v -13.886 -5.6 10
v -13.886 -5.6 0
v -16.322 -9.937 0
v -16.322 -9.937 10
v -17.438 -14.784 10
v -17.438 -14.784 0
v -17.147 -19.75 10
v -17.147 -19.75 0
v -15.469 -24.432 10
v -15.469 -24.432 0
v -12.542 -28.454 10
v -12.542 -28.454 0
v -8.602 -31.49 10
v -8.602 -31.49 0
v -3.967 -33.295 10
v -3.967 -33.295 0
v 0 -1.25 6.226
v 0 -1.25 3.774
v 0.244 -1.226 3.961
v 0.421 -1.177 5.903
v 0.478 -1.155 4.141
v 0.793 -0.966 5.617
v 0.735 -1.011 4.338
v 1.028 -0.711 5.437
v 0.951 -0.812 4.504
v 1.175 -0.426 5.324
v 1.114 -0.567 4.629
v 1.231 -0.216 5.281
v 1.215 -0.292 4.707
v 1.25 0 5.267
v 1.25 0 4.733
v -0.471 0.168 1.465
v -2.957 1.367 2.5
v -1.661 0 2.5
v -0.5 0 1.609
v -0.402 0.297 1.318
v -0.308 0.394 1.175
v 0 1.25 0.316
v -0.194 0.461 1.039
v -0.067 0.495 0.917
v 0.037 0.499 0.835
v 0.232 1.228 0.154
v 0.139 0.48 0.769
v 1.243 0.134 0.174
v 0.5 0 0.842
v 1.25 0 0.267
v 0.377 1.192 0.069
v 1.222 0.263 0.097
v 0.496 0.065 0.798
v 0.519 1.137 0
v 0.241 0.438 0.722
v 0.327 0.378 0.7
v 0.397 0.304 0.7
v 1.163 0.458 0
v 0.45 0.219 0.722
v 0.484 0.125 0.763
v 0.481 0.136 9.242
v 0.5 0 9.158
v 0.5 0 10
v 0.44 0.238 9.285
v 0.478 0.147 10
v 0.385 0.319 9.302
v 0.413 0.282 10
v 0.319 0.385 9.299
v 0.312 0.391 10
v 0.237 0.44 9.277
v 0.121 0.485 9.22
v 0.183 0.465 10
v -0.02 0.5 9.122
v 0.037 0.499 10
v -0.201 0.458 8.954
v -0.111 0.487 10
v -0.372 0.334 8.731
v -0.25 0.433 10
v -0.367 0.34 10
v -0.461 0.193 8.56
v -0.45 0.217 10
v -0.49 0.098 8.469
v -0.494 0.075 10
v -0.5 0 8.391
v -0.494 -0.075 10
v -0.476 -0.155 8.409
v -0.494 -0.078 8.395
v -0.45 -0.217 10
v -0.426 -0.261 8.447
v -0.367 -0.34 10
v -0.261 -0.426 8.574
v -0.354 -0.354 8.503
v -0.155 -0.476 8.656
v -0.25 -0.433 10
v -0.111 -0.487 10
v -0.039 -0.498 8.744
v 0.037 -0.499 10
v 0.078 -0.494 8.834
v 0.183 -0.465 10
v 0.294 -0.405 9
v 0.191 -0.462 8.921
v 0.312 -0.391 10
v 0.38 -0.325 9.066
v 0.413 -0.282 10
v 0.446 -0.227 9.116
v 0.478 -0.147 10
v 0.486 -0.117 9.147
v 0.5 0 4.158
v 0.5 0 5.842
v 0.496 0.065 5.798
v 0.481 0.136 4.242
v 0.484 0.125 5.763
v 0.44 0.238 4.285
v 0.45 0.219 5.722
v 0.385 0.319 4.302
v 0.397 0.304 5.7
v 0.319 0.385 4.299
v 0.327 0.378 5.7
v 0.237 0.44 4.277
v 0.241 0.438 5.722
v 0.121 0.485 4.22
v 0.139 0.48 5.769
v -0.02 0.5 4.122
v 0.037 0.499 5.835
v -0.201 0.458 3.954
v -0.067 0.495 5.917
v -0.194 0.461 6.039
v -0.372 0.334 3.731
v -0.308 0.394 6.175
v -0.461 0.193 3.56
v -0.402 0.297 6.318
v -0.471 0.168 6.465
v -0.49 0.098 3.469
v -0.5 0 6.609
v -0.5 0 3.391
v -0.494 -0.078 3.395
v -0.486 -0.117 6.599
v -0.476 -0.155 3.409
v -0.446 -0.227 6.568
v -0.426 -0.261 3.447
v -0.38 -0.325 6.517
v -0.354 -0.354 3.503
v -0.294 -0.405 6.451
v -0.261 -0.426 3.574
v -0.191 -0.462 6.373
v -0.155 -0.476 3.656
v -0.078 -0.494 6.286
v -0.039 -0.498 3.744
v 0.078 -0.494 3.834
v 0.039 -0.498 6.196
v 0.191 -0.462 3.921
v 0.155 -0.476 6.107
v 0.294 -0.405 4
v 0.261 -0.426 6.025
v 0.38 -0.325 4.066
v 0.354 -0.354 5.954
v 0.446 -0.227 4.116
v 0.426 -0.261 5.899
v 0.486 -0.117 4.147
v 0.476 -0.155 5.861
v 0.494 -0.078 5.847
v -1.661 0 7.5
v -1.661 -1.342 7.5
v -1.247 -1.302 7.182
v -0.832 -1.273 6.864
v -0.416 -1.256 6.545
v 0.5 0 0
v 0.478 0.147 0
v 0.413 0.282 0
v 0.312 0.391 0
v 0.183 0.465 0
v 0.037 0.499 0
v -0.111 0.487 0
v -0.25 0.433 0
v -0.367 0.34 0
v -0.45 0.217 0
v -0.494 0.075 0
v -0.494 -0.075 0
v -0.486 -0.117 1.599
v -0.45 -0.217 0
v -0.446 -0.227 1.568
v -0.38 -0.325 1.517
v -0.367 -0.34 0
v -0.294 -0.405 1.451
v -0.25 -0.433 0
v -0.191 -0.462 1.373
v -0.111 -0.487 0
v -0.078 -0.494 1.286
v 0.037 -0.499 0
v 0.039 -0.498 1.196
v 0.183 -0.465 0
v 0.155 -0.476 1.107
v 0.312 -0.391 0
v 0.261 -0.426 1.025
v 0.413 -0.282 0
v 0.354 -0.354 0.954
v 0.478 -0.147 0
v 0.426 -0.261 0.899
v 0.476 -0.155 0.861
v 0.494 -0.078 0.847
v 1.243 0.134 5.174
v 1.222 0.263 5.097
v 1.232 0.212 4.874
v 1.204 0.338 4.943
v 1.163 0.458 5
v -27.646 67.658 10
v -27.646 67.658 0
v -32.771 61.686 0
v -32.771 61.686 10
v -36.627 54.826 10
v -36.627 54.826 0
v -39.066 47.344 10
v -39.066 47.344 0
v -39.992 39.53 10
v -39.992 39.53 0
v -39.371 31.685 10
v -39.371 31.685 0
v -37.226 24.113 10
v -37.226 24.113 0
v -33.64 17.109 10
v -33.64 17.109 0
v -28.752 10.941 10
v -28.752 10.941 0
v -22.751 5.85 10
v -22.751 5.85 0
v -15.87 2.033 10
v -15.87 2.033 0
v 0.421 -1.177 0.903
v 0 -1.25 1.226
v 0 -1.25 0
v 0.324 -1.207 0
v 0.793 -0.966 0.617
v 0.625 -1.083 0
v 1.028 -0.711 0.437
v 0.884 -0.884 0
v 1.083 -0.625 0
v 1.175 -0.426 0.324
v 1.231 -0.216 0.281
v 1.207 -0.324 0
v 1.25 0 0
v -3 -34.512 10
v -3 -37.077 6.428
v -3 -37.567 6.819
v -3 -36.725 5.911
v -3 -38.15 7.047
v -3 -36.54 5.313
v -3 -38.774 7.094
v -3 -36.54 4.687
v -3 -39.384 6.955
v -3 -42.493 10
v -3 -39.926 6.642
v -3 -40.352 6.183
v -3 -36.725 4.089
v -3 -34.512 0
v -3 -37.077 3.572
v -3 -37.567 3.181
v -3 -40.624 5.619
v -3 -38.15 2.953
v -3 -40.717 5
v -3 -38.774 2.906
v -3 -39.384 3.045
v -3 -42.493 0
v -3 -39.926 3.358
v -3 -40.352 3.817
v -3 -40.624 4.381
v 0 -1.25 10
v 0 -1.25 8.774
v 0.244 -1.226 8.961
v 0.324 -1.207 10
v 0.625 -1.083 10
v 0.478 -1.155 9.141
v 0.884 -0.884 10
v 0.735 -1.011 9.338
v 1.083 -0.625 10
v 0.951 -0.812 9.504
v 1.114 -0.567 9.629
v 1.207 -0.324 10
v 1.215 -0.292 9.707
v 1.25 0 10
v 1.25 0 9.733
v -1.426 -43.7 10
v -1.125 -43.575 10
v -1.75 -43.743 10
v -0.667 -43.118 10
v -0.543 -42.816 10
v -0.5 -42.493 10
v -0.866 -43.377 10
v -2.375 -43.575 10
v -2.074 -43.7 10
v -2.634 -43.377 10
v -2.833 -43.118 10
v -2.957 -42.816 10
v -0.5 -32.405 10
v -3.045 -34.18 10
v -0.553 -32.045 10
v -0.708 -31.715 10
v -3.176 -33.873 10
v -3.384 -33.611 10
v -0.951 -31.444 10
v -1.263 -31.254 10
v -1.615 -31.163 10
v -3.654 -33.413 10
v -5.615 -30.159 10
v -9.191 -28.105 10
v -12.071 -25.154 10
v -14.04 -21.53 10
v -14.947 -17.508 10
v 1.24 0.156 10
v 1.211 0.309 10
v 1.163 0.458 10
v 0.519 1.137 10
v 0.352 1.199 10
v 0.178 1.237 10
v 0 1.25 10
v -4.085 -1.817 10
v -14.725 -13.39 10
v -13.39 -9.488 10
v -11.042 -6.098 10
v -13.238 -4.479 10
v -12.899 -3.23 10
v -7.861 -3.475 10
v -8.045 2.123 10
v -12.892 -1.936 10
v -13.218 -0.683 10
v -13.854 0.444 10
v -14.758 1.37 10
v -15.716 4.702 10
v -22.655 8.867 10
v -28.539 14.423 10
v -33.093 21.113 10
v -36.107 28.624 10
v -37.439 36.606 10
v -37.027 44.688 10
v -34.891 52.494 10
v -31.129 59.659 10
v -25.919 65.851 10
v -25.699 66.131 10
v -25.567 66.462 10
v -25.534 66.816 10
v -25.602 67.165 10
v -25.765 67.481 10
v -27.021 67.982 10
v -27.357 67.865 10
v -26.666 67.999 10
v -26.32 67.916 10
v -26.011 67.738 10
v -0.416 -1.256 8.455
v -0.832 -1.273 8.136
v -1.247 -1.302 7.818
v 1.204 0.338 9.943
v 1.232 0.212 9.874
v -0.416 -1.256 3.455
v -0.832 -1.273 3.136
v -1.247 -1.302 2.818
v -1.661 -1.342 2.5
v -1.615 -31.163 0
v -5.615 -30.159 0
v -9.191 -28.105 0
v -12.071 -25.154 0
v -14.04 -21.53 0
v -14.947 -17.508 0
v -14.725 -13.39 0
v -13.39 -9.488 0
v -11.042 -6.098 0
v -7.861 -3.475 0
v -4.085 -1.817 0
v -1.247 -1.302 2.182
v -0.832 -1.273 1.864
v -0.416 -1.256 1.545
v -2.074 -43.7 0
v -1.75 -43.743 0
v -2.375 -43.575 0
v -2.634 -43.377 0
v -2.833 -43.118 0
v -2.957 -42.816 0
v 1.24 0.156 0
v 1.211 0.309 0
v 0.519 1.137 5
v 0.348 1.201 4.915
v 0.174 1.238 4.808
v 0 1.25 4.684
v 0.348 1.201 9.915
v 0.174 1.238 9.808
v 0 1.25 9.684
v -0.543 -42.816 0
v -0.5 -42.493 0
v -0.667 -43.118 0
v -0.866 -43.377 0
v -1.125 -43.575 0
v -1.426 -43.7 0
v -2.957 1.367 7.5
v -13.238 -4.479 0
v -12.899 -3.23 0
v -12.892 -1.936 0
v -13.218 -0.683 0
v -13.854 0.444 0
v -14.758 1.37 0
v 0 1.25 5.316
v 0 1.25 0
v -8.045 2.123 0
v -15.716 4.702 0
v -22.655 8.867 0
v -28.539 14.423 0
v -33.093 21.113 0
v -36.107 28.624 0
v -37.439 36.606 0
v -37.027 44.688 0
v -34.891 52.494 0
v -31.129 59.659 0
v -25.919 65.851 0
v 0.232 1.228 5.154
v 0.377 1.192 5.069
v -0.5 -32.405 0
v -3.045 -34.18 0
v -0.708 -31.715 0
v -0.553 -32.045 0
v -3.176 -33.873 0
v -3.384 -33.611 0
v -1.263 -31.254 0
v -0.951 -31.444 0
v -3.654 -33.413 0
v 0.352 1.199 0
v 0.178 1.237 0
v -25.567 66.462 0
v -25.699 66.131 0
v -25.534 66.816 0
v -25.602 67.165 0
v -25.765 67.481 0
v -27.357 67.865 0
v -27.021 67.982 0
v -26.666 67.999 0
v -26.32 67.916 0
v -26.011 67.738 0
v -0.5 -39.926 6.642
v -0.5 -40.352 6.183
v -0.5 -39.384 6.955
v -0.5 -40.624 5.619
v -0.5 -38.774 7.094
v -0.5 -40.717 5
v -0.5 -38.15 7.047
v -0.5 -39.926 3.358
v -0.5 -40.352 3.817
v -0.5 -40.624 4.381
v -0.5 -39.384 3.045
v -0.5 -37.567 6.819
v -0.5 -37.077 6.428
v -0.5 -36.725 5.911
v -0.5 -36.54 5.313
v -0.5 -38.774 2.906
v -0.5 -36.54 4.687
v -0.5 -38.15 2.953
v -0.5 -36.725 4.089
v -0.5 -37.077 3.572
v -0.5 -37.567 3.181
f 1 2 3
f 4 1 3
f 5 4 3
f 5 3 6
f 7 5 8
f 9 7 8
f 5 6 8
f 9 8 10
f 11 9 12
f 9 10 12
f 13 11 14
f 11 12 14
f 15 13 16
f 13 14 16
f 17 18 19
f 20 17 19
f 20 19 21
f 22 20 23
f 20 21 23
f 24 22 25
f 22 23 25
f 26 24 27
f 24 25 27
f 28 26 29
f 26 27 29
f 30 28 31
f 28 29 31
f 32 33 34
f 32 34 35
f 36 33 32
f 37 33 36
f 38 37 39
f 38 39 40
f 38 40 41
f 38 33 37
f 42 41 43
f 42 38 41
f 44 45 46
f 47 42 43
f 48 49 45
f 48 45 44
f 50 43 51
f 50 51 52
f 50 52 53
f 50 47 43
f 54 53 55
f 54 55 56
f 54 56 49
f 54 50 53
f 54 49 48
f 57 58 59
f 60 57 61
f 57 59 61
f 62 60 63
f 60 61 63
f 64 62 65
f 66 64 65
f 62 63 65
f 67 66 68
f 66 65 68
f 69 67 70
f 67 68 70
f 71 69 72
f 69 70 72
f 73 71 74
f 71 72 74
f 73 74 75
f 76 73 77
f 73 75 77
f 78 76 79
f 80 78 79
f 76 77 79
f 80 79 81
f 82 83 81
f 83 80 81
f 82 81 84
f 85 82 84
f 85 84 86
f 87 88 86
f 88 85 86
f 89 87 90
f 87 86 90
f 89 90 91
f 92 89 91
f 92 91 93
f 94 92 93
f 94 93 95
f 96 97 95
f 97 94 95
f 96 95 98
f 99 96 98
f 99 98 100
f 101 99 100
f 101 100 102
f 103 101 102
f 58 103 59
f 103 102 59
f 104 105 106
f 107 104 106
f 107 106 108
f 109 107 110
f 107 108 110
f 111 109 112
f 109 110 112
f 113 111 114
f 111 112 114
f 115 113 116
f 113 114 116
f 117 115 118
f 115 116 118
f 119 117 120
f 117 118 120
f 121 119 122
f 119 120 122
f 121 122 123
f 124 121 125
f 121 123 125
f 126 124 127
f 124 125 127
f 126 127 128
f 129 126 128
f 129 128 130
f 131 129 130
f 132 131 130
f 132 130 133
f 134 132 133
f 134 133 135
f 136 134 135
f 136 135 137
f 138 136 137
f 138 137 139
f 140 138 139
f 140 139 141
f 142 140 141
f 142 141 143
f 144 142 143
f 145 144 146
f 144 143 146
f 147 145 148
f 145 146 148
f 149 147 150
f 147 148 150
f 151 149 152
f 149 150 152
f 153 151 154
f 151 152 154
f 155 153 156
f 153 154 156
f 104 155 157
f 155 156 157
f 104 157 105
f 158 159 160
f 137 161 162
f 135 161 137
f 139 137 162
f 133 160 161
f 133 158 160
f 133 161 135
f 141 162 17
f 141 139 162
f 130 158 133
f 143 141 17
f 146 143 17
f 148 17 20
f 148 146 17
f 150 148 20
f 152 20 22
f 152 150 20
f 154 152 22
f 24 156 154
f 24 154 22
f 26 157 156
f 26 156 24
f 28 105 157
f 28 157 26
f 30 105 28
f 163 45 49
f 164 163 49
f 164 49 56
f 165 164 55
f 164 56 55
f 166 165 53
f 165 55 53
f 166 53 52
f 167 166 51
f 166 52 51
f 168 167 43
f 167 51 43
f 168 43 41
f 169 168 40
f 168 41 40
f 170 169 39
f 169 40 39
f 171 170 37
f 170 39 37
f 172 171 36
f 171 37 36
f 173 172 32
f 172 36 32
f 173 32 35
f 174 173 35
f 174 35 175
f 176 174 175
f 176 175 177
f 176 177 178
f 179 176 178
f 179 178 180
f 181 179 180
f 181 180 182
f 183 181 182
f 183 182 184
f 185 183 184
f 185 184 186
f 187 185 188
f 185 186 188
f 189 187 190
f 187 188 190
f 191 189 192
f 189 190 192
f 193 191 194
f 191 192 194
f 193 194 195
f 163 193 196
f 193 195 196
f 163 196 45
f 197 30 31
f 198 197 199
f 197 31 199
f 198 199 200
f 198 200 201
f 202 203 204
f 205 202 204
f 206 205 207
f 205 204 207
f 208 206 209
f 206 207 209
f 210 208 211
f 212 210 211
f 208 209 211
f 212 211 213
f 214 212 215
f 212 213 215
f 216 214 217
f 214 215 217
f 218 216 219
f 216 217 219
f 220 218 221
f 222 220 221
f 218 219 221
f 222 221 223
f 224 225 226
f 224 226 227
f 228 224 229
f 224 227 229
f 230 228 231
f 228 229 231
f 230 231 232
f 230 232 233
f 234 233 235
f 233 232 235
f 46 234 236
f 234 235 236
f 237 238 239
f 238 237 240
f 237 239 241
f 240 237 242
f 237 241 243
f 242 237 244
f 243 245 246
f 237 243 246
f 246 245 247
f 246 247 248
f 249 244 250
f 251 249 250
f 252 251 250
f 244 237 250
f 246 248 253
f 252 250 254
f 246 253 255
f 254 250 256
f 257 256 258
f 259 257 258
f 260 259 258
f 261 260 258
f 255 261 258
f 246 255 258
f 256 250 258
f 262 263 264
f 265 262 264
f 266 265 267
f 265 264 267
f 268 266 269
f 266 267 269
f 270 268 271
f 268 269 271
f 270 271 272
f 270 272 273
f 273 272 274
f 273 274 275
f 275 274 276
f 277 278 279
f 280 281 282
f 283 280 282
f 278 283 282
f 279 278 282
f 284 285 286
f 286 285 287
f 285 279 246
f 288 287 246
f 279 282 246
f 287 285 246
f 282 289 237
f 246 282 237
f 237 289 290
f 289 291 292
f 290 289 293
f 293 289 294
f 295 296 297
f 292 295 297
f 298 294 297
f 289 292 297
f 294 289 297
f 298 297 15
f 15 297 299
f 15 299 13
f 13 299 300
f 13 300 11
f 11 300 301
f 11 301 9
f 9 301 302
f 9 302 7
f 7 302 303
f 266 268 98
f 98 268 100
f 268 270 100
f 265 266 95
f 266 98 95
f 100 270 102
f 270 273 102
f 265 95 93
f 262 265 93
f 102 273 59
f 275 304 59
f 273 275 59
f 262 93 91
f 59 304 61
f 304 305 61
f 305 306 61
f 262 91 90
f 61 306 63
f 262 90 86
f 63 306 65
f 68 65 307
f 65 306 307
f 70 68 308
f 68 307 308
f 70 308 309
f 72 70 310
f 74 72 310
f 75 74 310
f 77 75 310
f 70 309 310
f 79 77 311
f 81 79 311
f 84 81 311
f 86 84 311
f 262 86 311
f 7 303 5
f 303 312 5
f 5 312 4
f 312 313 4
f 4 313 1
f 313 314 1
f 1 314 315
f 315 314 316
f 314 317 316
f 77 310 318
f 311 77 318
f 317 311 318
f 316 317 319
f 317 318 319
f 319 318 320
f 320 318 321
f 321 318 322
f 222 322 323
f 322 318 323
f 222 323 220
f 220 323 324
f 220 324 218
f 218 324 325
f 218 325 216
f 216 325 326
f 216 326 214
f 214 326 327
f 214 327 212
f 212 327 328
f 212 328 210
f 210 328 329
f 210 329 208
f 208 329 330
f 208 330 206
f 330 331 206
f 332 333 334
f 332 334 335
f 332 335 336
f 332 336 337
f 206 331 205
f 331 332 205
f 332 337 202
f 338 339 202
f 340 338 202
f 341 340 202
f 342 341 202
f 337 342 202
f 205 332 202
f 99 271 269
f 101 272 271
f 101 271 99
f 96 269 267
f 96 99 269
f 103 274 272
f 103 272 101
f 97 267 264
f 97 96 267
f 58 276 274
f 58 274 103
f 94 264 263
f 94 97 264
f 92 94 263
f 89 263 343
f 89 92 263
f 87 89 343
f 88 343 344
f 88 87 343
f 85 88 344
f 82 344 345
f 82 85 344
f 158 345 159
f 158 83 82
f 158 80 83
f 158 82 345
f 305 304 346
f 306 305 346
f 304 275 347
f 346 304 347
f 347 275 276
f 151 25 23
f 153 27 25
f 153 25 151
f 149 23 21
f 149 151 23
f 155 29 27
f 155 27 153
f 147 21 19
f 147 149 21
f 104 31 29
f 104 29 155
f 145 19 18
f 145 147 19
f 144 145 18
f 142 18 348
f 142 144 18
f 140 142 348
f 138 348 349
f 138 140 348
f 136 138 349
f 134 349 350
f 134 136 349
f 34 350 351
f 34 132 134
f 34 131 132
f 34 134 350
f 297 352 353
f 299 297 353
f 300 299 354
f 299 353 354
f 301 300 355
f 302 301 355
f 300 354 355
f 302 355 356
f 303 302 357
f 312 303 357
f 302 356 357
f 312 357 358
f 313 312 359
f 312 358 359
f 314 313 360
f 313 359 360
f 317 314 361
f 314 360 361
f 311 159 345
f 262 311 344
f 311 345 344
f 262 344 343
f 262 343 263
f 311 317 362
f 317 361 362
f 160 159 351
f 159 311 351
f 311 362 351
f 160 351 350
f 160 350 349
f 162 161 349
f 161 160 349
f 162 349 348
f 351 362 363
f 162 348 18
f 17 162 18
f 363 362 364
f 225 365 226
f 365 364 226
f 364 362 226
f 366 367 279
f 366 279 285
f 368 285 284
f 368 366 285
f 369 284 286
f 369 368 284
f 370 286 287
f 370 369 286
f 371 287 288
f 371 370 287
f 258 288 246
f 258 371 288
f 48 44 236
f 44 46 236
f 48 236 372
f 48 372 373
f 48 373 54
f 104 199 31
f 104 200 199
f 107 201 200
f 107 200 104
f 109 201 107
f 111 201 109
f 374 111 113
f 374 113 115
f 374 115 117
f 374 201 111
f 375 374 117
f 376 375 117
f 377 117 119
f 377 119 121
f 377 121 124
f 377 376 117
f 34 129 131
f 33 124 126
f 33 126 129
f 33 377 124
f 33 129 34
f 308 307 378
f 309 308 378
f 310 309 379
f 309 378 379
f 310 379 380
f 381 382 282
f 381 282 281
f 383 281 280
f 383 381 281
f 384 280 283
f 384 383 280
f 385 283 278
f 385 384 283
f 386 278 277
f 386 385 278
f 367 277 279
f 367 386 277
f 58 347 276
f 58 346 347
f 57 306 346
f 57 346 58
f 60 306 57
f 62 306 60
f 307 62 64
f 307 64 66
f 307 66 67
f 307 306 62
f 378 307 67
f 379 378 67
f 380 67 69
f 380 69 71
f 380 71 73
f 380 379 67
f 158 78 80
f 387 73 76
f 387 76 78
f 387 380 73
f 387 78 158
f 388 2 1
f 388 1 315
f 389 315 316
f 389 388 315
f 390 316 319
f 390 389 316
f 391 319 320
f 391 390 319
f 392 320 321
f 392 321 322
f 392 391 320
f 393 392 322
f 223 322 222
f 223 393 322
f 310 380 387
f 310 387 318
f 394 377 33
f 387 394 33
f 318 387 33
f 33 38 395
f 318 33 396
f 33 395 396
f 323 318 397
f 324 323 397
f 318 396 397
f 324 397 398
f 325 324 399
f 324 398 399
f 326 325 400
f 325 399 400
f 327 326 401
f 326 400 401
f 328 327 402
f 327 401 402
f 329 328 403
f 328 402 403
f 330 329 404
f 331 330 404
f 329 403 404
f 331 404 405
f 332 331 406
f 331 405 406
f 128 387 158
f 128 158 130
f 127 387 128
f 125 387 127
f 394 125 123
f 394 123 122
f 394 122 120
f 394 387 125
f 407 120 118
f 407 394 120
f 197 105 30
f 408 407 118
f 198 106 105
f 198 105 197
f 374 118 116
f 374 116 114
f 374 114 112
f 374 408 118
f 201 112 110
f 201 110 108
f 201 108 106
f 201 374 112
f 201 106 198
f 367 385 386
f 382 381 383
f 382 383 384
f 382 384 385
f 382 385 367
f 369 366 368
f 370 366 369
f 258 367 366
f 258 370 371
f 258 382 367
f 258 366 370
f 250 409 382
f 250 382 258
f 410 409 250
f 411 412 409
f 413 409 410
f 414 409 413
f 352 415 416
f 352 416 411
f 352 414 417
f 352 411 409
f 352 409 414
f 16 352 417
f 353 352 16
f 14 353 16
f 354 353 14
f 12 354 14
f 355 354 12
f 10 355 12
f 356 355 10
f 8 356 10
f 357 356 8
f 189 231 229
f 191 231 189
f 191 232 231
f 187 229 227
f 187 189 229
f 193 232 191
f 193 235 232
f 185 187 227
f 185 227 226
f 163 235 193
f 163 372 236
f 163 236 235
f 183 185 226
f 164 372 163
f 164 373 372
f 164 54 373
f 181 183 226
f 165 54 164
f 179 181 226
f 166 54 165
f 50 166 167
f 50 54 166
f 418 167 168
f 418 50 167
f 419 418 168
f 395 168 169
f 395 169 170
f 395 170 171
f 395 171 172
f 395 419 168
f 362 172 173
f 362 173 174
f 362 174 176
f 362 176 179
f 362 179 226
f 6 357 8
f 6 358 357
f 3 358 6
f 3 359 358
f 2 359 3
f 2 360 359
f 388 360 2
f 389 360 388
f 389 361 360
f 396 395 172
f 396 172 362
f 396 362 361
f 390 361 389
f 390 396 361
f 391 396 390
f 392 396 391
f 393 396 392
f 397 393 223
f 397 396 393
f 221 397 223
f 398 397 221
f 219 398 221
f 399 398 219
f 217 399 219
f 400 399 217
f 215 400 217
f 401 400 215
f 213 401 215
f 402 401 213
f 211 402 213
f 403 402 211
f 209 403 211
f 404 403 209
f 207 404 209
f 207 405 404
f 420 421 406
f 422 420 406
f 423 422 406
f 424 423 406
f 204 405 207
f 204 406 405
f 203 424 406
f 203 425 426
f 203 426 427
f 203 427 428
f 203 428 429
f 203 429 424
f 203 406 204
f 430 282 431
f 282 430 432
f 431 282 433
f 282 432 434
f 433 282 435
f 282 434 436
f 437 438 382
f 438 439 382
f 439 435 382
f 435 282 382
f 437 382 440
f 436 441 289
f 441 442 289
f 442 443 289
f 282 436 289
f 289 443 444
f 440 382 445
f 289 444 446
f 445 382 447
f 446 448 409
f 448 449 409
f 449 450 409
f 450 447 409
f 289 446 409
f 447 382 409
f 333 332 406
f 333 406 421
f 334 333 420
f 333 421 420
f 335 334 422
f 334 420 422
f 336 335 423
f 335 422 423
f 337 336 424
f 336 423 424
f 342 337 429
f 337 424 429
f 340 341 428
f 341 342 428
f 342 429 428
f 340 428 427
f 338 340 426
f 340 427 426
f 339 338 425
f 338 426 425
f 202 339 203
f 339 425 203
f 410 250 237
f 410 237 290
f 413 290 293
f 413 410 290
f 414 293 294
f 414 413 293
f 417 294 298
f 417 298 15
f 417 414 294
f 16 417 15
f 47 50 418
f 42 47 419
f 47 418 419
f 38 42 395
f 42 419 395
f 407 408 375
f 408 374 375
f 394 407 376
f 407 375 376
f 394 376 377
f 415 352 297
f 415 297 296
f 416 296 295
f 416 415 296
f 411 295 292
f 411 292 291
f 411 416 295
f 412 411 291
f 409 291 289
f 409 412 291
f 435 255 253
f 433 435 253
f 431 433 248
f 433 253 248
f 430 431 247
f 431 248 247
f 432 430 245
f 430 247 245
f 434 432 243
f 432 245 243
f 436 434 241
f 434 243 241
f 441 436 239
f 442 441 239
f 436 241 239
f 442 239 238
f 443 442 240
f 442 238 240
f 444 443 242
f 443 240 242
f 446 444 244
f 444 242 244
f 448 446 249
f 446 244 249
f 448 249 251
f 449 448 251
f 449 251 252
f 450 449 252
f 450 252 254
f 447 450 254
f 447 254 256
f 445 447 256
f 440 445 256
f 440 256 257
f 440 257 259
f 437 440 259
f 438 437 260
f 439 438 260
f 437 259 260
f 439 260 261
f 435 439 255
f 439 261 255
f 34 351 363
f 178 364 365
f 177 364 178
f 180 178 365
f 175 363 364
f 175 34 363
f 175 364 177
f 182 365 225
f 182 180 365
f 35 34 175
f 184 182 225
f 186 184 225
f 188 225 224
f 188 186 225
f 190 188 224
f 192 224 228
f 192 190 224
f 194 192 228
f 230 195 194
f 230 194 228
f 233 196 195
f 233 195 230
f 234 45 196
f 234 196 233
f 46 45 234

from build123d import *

# Parameters (mm, degrees)
F1_DEPTH       = 10
F2_W           = 45
F2_H           = 10
F3_DEPTH       = 10
F4_R           = 0.5
F5_DEPTH       = 10
F6_R           = 2.1
F7_DEPTH       = 2.5
F8_T1_DEPTH    = 10
F8_T3_DEPTH    = 43.0998702926
F9_T1_DEPTH    = 10
F9_T3_DEPTH    = 15.8191503542
F9_T5_DEPTH    = 16.25
F9_T7_DEPTH    = 36.3051320704
F11_DEPTH      = 5
F11_TAPER      = -30
F11_DEPTH_BACK = 5


# Not quite as in the source:
# - a fillet or chamfer that OpenCascade refuses, or shapes differently, is made with other operations: its cross-section is extruded or revolved along the edge and cut away or added


with BuildPart() as f1:
    # F0 (on Top) → F1 (new body)
    with BuildSketch(Plane.XY):
        with BuildLine():
            ThreePointArc((0, -1.25), (0.8838834765, -0.8838834765), (1.25, 0))
            ThreePointArc((1.25, 0), (0.8838834765, 0.8838834765), (0, 1.25))
            ThreePointArc((0, 1.25), (-1.25, 0), (0, -1.25))
        make_face()
        with BuildLine():
            ThreePointArc((0, -1.25), (-1.25, 0), (0, 1.25))
            ThreePointArc((0, 1.25), (-3.9258033341, 0.8039751431), (-7.6514917116, -0.5113636364))
            ThreePointArc((-7.6514917116, -0.5113636364), (-3.8435305739, -1.0649126927), (0, -1.25))
        make_face()
        with BuildLine():
            ThreePointArc((-7.6514917116, -0.5113636364), (-3.9258033341, 0.8039751431), (0, 1.25))
            ThreePointArc((0, 1.25), (-37.5, 38.75), (0, 76.25))
            Line((0, 76.25), (0, 78.75))
            ThreePointArc((0, 78.75), (-39.8149126927, 42.5935305739), (-7.6514917116, -0.5113636364))
        make_face()
        with BuildLine():
            ThreePointArc((-0.5, -31.2416643506), (-14.9979159429, -15.9999652609), (0, -1.25))
            ThreePointArc((0, -1.25), (-3.8435305739, -1.0649126927), (-7.6514917116, -0.5113636364))
            ThreePointArc((-7.6514917116, -0.5113636364), (-17.3284932243, -18.69403817), (-3, -33.4909396496))
            Line((-3, -33.4909396496), (-3, -31.2416643506))
            Line((-3, -31.2416643506), (-0.5, -31.2416643506))
        make_face()
        with BuildLine():
            Line((-0.5, -33.7428556845), (-0.5, -31.2416643506))
            Line((-0.5, -31.2416643506), (-3, -31.2416643506))
            Line((-3, -31.2416643506), (-3, -33.4909396496))
            ThreePointArc((-3, -33.4909396496), (-1.7545271221, -33.661824562), (-0.5, -33.7428556845))
        make_face()
        with BuildLine():
            ThreePointArc((-0.5, -33.7428556845), (-1.7545271221, -33.661824562), (-3, -33.4909396496))
            Line((-3, -33.4909396496), (-3, -43.7428556845))
            Line((-3, -43.7428556845), (-0.5, -43.7428556845))
            Line((-0.5, -43.7428556845), (-0.5, -33.7428556845))
        make_face()
    extrude(amount=F1_DEPTH)

    # F2 (on Top) → F3 (cut, through all)
    with BuildSketch(Plane.XY):
        with Locations((0, 73.75)):
            Rectangle(F2_W, F2_H)
    extrude(amount=F3_DEPTH, mode=Mode.SUBTRACT)

    # F4 (on face) → F5 (cut, through all)
    with BuildSketch(Plane.XY.offset(10)):
        Circle(F4_R)
    extrude(amount=-F5_DEPTH, mode=Mode.SUBTRACT)

    # F6 (on face) → F7 (cut, through all)
    with BuildSketch(Plane(origin=(-3, 0, 0), x_dir=(0, -1, 0), z_dir=(-1, 0, 0))):
        with Locations((38.6168976671, 5)):
            Circle(F6_R)
    extrude(amount=-F7_DEPTH, mode=Mode.SUBTRACT)

    # F8: fillet of radius 5 on 2 edges, made by hand

    # F8_s2 → F8_t1 (join)
    with BuildSketch(Plane.XY):
        with BuildLine():
            ThreePointArc((-13.8860405137, -5.5997474747), (-13.0142523991, -1.2990941124), (-15.8697605871, 2.0328282828))
            ThreePointArc((-15.8697605871, 2.0328282828), (-11.8292246388, 0.5391449396), (-7.6514917116, -0.5113636364))
            ThreePointArc((-7.6514917116, -0.5113636364), (-11.0652264374, -2.6923171637), (-13.8860405137, -5.5997474747))
        make_face()
    extrude(amount=F8_T1_DEPTH)

    # F8_s4 → F8_t3 (cut)
    with BuildSketch(Plane.XY.offset(-16.5499351463)):
        with BuildLine():
            ThreePointArc((-22.5, 68.75), (-25.2284691248, 68.9356152516), (-27.6464669917, 67.6580068991))
            ThreePointArc((-27.6464669917, 67.6580068991), (-25.1595214868, 69.8465991477), (-22.5, 71.8218913883))
            Line((-22.5, 71.8218913883), (-22.5, 68.75))
        make_face()
    extrude(amount=F8_T3_DEPTH, mode=Mode.SUBTRACT)

    # F9: fillet of radius 1.25 on 5 edges, made by hand

    # F9_s2 → F9_t1 (join)
    with BuildSketch(Plane.XY):
        with BuildLine():
            ThreePointArc((-3, -34.5119823677), (-3.2710549896, -33.73470078), (-3.9666666667, -33.2945168766))
            ThreePointArc((-3.9666666667, -33.2945168766), (-3.4847175764, -33.3995406181), (-3, -33.4909396496))
            Line((-3, -33.4909396496), (-3, -34.5119823677))
        make_face()
    extrude(amount=F9_T1_DEPTH)

    # F9_s4 → F9_t3 (cut)
    with BuildSketch(Plane.XY.offset(-2.9095751771)):
        with BuildLine():
            ThreePointArc((-1.6153846154, -31.1627640813), (-0.8197394906, -31.5705600619), (-0.5, -32.4054944214))
            Line((-0.5, -32.4054944214), (-0.5, -31.2416643506))
            ThreePointArc((-0.5, -31.2416643506), (-1.0584277637, -31.2126110913), (-1.6153846154, -31.1627640813))
        make_face()
    extrude(amount=F9_T3_DEPTH, mode=Mode.SUBTRACT)

    # F9_s6 → F9_t5 (cut)
    with BuildSketch(Plane.XY.offset(-3.125)):
        with BuildLine():
            ThreePointArc((-0.5, -42.4928556845), (-0.8661165235, -43.376739161), (-1.75, -43.7428556845))
            Line((-1.75, -43.7428556845), (-0.5, -43.7428556845))
            Line((-0.5, -43.7428556845), (-0.5, -42.4928556845))
        make_face()
        with BuildLine():
            ThreePointArc((-1.75, -43.7428556845), (-2.6338834765, -43.376739161), (-3, -42.4928556845))
            Line((-3, -42.4928556845), (-3, -43.7428556845))
            Line((-3, -43.7428556845), (-1.75, -43.7428556845))
        make_face()
    extrude(amount=F9_T5_DEPTH, mode=Mode.SUBTRACT)

    # F9_s8 → F9_t7 (cut)
    with BuildSketch(Plane.XY.offset(-13.1525660352)):
        with BuildLine():
            ThreePointArc((-25.9185526928, 65.8512661385), (-25.8791274069, 67.6185918599), (-27.6464530598, 67.658020223))
            ThreePointArc((-27.6464530598, 67.658020223), (-25.2284596959, 68.9356172522), (-22.5, 68.75))
            ThreePointArc((-22.5, 68.75), (-24.2526230688, 67.3517529932), (-25.9185526928, 65.8512661385))
        make_face()
    extrude(amount=F9_T7_DEPTH, mode=Mode.SUBTRACT)

    # F10 (on Front) → F11 (cut, two sides)
    with BuildSketch(Plane.XZ) as f11_sk:
        Polygon((1.5, 0.0747326796), (1.5, 4.9252673204), (-1.6606699079, 2.5), align=None)
        Polygon((1.5, 9.9252673204), (-1.6606699079, 7.5), (1.5, 5.0747326796), align=None)
    extrude(amount=-F11_DEPTH, taper=F11_TAPER, mode=Mode.SUBTRACT)
    extrude(f11_sk.sketch, amount=F11_DEPTH_BACK, mode=Mode.SUBTRACT)


solid = f1.part
